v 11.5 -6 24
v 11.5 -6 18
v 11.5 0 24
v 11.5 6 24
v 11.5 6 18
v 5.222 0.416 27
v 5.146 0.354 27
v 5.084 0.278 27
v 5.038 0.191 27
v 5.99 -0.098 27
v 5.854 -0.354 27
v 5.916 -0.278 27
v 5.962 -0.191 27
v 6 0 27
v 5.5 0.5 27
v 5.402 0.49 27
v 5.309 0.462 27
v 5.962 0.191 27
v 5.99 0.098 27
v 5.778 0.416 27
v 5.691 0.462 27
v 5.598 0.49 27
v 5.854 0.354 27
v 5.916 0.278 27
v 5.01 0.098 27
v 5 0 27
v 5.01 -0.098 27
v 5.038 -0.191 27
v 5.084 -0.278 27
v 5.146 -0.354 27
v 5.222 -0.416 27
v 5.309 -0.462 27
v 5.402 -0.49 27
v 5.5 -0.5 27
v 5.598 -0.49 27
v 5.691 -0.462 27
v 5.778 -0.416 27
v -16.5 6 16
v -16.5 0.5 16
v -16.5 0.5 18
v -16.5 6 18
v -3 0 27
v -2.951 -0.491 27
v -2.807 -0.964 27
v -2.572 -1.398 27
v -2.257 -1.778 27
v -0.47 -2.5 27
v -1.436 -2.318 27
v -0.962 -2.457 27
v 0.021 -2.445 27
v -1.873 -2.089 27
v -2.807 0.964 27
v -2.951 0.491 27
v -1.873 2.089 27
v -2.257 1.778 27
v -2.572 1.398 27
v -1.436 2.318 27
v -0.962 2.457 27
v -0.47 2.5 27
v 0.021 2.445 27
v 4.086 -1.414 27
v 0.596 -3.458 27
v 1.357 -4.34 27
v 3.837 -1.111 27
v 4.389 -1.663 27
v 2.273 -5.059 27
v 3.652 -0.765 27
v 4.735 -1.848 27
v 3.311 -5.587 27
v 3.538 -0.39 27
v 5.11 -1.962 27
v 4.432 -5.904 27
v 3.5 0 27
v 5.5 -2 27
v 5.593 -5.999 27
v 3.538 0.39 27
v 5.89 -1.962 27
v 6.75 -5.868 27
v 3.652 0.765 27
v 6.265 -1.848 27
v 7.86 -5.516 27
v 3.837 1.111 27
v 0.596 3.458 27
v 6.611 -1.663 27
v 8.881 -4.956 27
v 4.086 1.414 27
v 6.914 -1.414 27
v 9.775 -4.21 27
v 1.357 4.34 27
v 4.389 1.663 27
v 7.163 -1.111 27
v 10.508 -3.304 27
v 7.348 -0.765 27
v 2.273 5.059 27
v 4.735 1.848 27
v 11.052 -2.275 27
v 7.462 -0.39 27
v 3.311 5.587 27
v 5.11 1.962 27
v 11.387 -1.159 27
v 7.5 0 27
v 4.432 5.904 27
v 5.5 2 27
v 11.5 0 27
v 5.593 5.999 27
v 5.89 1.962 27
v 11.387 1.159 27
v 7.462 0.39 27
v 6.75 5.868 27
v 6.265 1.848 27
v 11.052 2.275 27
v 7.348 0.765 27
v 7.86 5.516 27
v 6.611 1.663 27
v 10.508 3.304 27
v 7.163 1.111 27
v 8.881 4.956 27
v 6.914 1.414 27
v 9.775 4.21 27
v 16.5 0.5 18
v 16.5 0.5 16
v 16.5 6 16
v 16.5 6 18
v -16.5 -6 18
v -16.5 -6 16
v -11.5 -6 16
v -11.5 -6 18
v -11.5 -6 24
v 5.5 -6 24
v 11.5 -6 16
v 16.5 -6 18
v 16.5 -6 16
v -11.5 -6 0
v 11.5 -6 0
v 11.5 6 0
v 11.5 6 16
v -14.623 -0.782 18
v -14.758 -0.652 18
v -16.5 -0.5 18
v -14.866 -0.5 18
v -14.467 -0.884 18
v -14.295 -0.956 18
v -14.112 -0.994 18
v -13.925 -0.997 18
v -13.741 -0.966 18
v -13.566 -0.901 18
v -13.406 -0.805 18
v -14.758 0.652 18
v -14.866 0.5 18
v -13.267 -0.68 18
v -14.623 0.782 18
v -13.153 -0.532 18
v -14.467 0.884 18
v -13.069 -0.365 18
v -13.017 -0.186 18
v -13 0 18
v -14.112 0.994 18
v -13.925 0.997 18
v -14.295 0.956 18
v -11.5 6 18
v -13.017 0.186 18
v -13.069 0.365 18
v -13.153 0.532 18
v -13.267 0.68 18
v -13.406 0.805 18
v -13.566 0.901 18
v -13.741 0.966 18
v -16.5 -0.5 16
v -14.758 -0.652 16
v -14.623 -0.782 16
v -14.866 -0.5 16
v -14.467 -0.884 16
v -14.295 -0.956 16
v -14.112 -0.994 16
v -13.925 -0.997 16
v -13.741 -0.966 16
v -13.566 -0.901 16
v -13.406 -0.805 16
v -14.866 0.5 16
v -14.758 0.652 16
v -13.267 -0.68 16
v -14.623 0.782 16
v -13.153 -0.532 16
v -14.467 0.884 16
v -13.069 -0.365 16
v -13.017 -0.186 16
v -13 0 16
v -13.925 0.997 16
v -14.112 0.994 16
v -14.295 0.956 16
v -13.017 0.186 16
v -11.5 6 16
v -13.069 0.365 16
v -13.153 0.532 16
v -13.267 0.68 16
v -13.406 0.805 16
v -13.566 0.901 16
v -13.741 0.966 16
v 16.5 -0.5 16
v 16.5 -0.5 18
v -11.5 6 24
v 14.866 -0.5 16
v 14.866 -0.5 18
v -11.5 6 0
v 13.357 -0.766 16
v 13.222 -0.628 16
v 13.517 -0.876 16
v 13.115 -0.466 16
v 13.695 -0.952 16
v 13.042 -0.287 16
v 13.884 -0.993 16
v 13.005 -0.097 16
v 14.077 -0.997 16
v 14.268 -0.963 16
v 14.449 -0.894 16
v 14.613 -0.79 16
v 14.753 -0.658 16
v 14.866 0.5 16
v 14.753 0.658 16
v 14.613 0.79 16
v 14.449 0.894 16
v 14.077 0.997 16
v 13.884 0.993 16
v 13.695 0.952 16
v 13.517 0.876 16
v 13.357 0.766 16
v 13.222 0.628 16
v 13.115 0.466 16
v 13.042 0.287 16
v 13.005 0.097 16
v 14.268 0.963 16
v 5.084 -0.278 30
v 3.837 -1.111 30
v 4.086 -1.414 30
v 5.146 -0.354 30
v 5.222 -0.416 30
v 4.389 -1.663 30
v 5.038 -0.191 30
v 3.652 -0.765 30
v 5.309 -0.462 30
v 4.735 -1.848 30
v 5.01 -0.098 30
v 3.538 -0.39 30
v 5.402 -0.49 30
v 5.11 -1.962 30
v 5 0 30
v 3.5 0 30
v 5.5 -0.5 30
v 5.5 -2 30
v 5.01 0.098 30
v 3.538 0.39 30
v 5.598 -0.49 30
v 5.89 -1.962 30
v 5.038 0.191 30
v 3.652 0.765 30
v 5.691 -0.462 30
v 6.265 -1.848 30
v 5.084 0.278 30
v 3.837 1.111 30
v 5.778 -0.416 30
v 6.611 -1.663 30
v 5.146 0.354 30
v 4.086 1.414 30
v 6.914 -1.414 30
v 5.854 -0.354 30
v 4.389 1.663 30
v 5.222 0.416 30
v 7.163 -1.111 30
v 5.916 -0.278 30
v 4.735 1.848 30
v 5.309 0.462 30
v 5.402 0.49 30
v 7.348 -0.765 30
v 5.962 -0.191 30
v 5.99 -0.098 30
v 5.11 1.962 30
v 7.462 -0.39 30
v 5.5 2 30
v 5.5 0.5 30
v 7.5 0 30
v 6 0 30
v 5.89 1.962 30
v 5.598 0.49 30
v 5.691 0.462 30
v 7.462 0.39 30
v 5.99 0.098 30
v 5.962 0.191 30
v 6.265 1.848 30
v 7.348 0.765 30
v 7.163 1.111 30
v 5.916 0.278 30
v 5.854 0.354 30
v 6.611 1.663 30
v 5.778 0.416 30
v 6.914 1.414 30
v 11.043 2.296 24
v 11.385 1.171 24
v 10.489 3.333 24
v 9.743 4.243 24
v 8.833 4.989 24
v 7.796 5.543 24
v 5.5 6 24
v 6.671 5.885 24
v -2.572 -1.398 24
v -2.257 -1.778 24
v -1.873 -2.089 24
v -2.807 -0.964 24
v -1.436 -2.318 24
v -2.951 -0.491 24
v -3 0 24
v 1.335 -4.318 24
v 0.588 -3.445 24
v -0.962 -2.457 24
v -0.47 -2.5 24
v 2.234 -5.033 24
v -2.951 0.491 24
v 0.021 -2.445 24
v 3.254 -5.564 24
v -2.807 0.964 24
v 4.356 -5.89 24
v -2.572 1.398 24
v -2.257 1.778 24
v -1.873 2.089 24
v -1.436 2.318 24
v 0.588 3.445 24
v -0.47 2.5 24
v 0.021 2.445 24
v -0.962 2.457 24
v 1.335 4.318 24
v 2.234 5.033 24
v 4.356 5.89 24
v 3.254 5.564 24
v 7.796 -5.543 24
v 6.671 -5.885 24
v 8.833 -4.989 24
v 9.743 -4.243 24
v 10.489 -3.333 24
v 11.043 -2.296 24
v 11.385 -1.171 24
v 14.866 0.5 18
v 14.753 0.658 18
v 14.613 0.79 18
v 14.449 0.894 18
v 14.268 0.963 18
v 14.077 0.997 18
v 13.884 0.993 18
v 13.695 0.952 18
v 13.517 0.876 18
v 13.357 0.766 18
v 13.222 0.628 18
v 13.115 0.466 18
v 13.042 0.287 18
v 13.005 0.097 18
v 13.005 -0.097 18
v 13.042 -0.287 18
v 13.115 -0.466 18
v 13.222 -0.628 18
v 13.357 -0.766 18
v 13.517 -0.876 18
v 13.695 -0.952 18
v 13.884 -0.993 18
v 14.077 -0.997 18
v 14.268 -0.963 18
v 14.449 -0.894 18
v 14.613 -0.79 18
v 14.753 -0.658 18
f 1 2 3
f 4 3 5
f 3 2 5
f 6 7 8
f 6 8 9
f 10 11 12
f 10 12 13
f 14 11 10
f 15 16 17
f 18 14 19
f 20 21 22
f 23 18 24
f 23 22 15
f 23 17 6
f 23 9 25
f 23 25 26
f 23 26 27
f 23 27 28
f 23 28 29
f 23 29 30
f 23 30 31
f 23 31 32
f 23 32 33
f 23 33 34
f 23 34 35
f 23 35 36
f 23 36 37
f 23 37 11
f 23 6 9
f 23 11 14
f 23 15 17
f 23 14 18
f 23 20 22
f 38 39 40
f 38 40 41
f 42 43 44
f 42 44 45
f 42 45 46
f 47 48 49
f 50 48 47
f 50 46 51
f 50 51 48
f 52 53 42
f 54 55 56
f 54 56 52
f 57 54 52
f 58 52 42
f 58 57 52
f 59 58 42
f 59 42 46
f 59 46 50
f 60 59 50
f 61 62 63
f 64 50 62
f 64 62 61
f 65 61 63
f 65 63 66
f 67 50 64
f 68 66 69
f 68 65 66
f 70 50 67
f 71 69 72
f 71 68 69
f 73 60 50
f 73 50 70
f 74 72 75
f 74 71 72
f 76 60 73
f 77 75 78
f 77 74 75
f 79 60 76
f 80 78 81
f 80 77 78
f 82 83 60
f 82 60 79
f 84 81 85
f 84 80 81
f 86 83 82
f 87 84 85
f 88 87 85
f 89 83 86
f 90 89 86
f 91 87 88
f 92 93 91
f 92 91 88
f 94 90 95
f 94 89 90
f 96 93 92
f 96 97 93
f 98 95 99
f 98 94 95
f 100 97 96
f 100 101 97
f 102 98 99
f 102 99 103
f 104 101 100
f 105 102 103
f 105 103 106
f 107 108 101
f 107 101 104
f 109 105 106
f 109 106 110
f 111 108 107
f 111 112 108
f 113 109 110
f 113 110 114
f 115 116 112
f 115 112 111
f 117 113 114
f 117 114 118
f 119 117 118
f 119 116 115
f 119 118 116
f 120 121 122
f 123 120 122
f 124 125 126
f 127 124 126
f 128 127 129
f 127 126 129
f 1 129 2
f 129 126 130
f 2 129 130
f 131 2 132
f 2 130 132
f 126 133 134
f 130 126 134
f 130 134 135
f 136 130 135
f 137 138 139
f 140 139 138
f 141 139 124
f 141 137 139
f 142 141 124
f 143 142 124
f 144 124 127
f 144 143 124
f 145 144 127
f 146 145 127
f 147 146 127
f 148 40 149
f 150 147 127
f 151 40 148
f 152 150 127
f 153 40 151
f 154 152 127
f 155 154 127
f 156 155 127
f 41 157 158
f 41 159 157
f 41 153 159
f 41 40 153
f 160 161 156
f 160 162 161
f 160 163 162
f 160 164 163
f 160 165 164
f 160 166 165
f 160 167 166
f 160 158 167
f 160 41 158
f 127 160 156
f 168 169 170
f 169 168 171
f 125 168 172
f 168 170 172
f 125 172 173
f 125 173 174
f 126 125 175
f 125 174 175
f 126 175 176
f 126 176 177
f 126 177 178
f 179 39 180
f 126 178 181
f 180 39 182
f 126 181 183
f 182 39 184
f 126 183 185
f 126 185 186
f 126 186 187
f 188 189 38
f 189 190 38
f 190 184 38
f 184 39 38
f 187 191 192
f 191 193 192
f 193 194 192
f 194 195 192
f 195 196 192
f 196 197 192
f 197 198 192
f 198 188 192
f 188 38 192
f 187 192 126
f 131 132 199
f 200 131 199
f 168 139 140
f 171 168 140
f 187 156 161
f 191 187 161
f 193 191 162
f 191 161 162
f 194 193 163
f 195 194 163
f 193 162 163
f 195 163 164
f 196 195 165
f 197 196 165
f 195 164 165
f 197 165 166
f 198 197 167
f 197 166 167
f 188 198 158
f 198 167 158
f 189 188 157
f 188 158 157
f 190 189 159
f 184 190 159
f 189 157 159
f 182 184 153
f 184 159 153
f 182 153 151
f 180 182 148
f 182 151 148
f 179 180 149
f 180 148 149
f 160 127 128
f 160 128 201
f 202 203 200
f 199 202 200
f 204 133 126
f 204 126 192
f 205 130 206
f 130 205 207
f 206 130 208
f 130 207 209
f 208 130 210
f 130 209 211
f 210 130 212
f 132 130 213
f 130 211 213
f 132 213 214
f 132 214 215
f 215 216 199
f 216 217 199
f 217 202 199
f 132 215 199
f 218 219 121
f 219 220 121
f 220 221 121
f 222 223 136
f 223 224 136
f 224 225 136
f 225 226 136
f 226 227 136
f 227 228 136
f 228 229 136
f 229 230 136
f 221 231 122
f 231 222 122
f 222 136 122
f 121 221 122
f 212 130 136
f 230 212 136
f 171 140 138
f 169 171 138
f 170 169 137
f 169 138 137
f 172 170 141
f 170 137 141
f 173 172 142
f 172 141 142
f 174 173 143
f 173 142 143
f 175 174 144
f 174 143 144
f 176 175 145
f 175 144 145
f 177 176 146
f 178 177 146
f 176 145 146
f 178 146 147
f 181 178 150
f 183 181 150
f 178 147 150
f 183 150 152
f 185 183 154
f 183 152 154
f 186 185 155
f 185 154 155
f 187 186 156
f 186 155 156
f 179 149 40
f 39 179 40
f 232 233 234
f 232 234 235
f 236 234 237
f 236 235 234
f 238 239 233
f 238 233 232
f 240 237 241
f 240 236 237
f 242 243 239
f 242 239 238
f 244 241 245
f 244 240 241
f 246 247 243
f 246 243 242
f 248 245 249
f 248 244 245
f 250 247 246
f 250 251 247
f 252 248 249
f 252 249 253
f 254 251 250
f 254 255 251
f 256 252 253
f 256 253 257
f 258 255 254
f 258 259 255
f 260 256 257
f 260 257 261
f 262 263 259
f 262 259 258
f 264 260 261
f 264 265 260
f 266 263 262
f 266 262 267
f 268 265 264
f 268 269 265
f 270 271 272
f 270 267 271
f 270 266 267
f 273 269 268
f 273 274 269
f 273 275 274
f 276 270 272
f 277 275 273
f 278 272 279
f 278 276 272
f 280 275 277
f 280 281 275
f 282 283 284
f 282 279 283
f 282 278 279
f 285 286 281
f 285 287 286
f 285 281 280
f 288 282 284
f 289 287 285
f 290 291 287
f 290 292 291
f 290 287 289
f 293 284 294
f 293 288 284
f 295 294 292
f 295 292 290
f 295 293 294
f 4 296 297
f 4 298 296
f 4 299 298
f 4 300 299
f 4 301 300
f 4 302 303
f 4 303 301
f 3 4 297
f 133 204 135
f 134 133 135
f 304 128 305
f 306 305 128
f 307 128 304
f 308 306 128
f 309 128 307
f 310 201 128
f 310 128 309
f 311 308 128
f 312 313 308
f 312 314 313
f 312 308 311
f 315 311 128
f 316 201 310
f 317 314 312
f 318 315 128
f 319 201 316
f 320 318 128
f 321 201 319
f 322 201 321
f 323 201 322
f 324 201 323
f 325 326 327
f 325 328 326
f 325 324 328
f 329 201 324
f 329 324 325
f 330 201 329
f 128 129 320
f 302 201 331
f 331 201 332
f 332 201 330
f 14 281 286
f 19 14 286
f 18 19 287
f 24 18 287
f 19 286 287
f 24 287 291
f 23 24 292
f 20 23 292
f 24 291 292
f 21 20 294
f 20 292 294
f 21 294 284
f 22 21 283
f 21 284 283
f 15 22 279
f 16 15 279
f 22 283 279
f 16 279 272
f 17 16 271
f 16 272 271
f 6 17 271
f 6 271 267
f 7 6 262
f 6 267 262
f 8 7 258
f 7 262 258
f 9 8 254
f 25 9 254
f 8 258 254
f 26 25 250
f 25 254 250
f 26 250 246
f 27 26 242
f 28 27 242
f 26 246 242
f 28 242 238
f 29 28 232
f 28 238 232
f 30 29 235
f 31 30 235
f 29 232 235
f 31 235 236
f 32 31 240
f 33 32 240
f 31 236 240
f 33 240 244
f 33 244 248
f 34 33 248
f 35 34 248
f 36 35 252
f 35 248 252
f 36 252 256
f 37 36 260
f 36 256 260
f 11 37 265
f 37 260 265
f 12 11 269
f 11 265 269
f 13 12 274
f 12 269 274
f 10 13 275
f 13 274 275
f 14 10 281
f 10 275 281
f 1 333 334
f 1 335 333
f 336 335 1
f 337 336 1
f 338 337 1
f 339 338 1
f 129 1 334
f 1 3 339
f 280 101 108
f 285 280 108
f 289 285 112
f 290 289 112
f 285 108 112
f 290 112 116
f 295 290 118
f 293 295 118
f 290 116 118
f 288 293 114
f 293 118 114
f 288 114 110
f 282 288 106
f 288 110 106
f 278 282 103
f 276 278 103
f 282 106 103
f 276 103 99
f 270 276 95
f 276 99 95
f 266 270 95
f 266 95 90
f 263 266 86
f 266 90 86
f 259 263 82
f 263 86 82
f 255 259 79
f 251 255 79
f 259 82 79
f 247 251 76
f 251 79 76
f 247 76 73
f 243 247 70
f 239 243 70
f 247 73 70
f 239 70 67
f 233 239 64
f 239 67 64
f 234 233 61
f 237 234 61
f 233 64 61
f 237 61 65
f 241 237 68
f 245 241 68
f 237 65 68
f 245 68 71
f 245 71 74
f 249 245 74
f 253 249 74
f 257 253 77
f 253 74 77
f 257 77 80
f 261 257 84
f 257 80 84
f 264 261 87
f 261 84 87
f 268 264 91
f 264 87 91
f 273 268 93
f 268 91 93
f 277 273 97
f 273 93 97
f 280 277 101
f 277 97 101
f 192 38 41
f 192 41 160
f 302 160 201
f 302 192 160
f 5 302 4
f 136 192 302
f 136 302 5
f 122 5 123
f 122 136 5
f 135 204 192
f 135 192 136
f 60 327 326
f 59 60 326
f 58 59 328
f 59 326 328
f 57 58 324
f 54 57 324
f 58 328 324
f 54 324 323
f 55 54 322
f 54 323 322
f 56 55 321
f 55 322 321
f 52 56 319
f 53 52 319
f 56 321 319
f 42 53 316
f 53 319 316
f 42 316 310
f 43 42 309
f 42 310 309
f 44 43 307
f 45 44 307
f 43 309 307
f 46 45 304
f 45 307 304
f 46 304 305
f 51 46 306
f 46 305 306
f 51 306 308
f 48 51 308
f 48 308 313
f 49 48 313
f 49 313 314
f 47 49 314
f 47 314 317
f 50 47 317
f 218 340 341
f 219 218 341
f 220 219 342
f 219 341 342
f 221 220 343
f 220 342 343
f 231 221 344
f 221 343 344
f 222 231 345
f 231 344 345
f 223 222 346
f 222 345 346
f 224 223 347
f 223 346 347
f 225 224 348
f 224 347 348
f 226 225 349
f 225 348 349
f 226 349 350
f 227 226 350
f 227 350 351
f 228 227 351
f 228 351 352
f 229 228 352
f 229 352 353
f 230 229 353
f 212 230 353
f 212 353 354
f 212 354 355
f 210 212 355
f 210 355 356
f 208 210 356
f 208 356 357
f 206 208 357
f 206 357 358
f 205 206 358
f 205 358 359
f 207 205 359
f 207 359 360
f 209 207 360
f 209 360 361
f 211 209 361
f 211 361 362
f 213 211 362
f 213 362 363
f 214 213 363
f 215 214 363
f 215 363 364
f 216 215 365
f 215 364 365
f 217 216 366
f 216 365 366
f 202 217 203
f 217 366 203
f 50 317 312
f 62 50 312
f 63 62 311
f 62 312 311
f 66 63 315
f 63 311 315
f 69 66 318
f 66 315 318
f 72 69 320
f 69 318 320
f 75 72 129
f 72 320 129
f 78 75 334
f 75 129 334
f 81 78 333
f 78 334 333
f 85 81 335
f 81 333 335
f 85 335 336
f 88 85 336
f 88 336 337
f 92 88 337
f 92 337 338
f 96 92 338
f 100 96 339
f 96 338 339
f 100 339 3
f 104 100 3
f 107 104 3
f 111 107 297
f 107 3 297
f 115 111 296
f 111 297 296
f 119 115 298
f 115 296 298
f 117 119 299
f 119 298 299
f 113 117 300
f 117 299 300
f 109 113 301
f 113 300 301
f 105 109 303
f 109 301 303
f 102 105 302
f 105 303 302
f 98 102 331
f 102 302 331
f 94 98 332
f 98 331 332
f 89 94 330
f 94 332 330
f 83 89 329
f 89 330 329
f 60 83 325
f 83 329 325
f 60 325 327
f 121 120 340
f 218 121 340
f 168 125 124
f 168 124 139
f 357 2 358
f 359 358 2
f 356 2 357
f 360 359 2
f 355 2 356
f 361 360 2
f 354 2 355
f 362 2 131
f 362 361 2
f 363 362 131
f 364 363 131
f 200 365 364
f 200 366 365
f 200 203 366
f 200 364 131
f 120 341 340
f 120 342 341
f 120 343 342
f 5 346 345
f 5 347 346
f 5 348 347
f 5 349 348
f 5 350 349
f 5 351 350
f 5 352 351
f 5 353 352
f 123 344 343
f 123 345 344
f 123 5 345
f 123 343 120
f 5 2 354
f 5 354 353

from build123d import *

# Parameters (mm, degrees)
F0_W      = 23
F0_H      = 12
F1_DEPTH  = 16
F2_W      = 33
F2_H      = 12
F3_DEPTH  = 2
F4_W      = 23
F4_H      = 12
F5_DEPTH  = 6
F7_DEPTH  = 3
F8_R      = 2
F9_DEPTH  = 3
F11_DEPTH = 18.001
F12_R     = 0.5
F13_DEPTH = 3


with BuildPart() as f1:
    # F0 (on Top) → F1 (new body)
    with BuildSketch(Plane.XY):
        Rectangle(F0_W, F0_H)
    extrude(amount=F1_DEPTH)

    # F2 (on face) → F3 (join)
    with BuildSketch(Plane.XY.offset(16)):
        Rectangle(F2_W, F2_H)
    extrude(amount=F3_DEPTH)

    # F4 (on face) → F5 (join)
    with BuildSketch(Plane.XY.offset(18)):
        Rectangle(F4_W, F4_H)
    extrude(amount=F5_DEPTH)

    # F6 (on face) → F7 (join)
    with BuildSketch(Plane.XY.offset(24)):
        with BuildLine():
            ThreePointArc((0.0208333333, -2.4451447071), (6.75, -5.8683472972), (11.5, 0))
            ThreePointArc((11.5, 0), (6.75, 5.8683472972), (0.0208333333, 2.4451447071))
            ThreePointArc((0.0208333333, 2.4451447071), (1.4432039694, 1.572882174), (2, 0))
            ThreePointArc((2, 0), (1.4432039694, -1.572882174), (0.0208333333, -2.4451447071))
        make_face()
        with BuildLine():
            ThreePointArc((2, 0), (1.4432039694, 1.572882174), (0.0208333333, 2.4451447071))
            ThreePointArc((0.0208333333, 2.4451447071), (-0.5, 0), (0.0208333333, -2.4451447071))
            ThreePointArc((0.0208333333, -2.4451447071), (1.4432039694, -1.572882174), (2, 0))
        make_face()
        with BuildLine():
            ThreePointArc((0.0208333333, -2.4451447071), (-0.5, 0), (0.0208333333, 2.4451447071))
            ThreePointArc((0.0208333333, 2.4451447071), (-3, 0), (0.0208333333, -2.4451447071))
        make_face()
    extrude(amount=F7_DEPTH)

    # F8 (on face) → F9 (join)
    with BuildSketch(Plane.XY.offset(27)):
        with Locations((5.5, 0)):
            Circle(F8_R)
    extrude(amount=F9_DEPTH)

    # F10 (on face) → F11 (cut, through all)
    with BuildSketch(Plane.XY.offset(18)):
        with BuildLine():
            ThreePointArc((-14.8660254038, -0.5), (-13.7411809549, -0.9659258263), (-13, 0))
            ThreePointArc((-13, 0), (-13.7411809549, 0.9659258263), (-14.8660254038, 0.5))
            Line((-14.8660254038, 0.5), (-14.8660254038, -0.5))
        make_face()
        with BuildLine():
            Line((-14.8660254038, -0.5), (-14.8660254038, 0.5))
            ThreePointArc((-14.8660254038, 0.5), (-15, 0), (-14.8660254038, -0.5))
        make_face()
        with BuildLine():
            ThreePointArc((-14.8660254038, -0.5), (-15, 0), (-14.8660254038, 0.5))
            Line((-14.8660254038, 0.5), (-16.5, 0.5))
            Line((-16.5, 0.5), (-16.5, -0.5))
            Line((-16.5, -0.5), (-14.8660254038, -0.5))
        make_face()
        with BuildLine():
            ThreePointArc((14.8660254038, -0.5), (14.9659258263, -0.2588190451), (15, 0))
            ThreePointArc((15, 0), (14.9659258263, 0.2588190451), (14.8660254038, 0.5))
            Line((14.8660254038, 0.5), (14.8660254038, -0.5))
        make_face()
        with BuildLine():
            ThreePointArc((14.8660254038, 0.5), (14.9659258263, 0.2588190451), (15, 0))
            ThreePointArc((15, 0), (14.9659258263, -0.2588190451), (14.8660254038, -0.5))
            Line((14.8660254038, -0.5), (16.5, -0.5))
            Line((16.5, -0.5), (16.5, 0.5))
            Line((16.5, 0.5), (14.8660254038, 0.5))
        make_face()
        with BuildLine():
            Line((14.8660254038, -0.5), (14.8660254038, 0.5))
            ThreePointArc((14.8660254038, 0.5), (13, 0), (14.8660254038, -0.5))
        make_face()
    extrude(amount=-F11_DEPTH, mode=Mode.SUBTRACT)

    # F12 (on face) → F13 (cut)
    with BuildSketch(Plane.XY.offset(30)):
        with Locations((5.5, 0)):
            Circle(F12_R)
    extrude(amount=-F13_DEPTH, mode=Mode.SUBTRACT)


solid = f1.part
